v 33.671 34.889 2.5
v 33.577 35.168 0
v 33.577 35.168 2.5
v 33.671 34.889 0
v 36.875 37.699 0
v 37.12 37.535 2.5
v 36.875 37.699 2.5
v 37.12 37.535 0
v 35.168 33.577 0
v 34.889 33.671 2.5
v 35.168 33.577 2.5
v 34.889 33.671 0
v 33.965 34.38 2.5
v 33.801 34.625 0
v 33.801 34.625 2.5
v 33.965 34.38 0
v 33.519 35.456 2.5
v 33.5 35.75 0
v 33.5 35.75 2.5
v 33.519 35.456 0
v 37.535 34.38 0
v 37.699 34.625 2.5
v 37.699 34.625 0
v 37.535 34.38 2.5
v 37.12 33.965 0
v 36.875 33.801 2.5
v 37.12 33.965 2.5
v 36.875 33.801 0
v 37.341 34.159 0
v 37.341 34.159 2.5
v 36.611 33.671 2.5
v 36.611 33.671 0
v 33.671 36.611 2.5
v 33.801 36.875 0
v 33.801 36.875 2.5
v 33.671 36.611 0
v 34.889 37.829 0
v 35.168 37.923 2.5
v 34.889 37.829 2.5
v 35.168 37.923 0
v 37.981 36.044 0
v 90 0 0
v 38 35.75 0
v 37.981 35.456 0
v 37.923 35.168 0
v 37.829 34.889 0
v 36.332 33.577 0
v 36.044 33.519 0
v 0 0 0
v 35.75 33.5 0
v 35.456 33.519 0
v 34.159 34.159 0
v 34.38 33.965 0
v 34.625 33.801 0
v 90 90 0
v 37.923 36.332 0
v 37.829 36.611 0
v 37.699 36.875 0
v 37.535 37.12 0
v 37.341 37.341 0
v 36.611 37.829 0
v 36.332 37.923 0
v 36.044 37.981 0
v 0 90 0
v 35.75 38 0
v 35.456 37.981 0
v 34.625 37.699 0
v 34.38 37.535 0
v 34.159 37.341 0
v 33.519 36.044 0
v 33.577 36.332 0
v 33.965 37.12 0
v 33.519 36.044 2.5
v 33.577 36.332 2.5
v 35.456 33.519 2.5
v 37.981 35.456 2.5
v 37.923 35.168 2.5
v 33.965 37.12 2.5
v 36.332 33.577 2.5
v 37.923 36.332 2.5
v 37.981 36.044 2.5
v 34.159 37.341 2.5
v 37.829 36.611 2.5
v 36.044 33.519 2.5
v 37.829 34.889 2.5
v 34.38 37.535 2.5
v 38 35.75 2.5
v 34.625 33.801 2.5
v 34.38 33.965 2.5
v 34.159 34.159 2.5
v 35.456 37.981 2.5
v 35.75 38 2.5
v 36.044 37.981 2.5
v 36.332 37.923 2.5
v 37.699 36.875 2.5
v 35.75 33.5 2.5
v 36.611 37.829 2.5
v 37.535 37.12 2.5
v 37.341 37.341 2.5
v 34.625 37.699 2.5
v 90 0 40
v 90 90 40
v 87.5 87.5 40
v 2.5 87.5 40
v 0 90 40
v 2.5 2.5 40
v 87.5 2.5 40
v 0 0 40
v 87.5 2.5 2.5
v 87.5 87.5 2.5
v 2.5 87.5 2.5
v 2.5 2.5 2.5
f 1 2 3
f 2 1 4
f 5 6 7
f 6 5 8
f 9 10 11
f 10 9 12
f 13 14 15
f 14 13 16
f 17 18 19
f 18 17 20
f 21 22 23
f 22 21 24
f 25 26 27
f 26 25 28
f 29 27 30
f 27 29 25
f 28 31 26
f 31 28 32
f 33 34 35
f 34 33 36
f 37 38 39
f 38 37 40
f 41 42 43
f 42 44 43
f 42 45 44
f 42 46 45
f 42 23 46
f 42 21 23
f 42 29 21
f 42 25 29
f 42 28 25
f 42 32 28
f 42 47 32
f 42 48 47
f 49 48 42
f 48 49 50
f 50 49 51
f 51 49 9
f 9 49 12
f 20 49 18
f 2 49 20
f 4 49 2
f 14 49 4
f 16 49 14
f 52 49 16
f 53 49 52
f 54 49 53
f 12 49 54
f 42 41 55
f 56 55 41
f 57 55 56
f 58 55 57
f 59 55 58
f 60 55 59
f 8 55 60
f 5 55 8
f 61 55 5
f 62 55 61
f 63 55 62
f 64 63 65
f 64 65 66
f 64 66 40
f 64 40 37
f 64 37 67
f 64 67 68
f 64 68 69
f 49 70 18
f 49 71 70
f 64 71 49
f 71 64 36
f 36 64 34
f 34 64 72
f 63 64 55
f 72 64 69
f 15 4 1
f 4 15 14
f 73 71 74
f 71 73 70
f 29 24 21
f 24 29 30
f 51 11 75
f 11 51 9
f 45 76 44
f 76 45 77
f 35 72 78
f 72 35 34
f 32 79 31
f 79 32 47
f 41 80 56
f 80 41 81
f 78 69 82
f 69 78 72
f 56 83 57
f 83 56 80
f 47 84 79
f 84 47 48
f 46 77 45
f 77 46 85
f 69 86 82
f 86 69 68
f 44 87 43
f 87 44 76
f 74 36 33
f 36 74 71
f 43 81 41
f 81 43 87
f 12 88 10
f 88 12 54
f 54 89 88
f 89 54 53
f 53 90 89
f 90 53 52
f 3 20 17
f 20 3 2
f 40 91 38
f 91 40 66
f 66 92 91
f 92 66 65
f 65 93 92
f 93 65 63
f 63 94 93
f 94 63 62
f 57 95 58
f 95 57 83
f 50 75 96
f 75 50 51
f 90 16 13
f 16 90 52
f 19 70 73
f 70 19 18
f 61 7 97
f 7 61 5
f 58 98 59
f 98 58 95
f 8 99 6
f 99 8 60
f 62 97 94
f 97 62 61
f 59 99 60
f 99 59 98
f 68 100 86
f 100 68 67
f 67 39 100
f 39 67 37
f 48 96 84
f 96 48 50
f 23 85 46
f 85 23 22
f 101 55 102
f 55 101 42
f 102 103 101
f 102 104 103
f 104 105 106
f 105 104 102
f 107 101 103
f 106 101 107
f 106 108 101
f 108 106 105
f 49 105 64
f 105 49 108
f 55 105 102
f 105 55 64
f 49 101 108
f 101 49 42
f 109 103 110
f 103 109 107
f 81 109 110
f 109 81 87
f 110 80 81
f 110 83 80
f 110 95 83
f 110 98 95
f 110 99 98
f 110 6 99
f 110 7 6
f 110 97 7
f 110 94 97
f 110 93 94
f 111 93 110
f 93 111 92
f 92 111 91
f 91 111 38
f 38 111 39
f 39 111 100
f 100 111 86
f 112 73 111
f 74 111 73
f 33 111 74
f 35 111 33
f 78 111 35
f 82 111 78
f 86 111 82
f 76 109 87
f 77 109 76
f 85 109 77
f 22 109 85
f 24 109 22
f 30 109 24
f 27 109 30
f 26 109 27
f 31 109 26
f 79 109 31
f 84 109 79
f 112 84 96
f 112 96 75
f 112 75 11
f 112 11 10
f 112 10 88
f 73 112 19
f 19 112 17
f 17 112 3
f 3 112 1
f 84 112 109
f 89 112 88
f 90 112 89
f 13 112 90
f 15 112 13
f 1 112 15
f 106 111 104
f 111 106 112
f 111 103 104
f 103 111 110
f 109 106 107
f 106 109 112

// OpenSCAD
// Fan cover - a simple open box (open top) that mounts over a round PC case fan to turn it into
// a magnetic stirrer. The top plate is the stirring surface. This is the print orientation: the
// top plate lies on the bed (z = 0) and the walls rise upward. NOVEL general part.
//

top     = 2;
walls   = 2.5;
open_z  = 40;
X       = 90;
Y       = 90;
screw   = 4.5;
pattern = 71.5;
notch_w = 12;
notch_d = 8;

$fn = 48;

inner_x = X - 2 * walls;
inner_y = Y - 2 * walls;
open_e  = open_z - walls;   // top of the walls (the rim the open top sits on)

difference() {
    cube([X, Y, open_z]);
    translate([walls, walls, walls]) cube([inner_x, inner_y, open_z - walls]);   // hollow, open top
    for (i = [0:3])
        rotate([0, 0, 90 * i])
            translate([-pattern / 2, -pattern / 2, 0])
                cylinder(h = top + 1, d = screw);                                  // screw holes
    // cable notch in one wall (front left, open edge facing +X): 12 mm wide, 8 mm deep
    translate([-X / 2, -Y / 2, open_e - notch_d]) cube([X, notch_w, notch_d]);
}
